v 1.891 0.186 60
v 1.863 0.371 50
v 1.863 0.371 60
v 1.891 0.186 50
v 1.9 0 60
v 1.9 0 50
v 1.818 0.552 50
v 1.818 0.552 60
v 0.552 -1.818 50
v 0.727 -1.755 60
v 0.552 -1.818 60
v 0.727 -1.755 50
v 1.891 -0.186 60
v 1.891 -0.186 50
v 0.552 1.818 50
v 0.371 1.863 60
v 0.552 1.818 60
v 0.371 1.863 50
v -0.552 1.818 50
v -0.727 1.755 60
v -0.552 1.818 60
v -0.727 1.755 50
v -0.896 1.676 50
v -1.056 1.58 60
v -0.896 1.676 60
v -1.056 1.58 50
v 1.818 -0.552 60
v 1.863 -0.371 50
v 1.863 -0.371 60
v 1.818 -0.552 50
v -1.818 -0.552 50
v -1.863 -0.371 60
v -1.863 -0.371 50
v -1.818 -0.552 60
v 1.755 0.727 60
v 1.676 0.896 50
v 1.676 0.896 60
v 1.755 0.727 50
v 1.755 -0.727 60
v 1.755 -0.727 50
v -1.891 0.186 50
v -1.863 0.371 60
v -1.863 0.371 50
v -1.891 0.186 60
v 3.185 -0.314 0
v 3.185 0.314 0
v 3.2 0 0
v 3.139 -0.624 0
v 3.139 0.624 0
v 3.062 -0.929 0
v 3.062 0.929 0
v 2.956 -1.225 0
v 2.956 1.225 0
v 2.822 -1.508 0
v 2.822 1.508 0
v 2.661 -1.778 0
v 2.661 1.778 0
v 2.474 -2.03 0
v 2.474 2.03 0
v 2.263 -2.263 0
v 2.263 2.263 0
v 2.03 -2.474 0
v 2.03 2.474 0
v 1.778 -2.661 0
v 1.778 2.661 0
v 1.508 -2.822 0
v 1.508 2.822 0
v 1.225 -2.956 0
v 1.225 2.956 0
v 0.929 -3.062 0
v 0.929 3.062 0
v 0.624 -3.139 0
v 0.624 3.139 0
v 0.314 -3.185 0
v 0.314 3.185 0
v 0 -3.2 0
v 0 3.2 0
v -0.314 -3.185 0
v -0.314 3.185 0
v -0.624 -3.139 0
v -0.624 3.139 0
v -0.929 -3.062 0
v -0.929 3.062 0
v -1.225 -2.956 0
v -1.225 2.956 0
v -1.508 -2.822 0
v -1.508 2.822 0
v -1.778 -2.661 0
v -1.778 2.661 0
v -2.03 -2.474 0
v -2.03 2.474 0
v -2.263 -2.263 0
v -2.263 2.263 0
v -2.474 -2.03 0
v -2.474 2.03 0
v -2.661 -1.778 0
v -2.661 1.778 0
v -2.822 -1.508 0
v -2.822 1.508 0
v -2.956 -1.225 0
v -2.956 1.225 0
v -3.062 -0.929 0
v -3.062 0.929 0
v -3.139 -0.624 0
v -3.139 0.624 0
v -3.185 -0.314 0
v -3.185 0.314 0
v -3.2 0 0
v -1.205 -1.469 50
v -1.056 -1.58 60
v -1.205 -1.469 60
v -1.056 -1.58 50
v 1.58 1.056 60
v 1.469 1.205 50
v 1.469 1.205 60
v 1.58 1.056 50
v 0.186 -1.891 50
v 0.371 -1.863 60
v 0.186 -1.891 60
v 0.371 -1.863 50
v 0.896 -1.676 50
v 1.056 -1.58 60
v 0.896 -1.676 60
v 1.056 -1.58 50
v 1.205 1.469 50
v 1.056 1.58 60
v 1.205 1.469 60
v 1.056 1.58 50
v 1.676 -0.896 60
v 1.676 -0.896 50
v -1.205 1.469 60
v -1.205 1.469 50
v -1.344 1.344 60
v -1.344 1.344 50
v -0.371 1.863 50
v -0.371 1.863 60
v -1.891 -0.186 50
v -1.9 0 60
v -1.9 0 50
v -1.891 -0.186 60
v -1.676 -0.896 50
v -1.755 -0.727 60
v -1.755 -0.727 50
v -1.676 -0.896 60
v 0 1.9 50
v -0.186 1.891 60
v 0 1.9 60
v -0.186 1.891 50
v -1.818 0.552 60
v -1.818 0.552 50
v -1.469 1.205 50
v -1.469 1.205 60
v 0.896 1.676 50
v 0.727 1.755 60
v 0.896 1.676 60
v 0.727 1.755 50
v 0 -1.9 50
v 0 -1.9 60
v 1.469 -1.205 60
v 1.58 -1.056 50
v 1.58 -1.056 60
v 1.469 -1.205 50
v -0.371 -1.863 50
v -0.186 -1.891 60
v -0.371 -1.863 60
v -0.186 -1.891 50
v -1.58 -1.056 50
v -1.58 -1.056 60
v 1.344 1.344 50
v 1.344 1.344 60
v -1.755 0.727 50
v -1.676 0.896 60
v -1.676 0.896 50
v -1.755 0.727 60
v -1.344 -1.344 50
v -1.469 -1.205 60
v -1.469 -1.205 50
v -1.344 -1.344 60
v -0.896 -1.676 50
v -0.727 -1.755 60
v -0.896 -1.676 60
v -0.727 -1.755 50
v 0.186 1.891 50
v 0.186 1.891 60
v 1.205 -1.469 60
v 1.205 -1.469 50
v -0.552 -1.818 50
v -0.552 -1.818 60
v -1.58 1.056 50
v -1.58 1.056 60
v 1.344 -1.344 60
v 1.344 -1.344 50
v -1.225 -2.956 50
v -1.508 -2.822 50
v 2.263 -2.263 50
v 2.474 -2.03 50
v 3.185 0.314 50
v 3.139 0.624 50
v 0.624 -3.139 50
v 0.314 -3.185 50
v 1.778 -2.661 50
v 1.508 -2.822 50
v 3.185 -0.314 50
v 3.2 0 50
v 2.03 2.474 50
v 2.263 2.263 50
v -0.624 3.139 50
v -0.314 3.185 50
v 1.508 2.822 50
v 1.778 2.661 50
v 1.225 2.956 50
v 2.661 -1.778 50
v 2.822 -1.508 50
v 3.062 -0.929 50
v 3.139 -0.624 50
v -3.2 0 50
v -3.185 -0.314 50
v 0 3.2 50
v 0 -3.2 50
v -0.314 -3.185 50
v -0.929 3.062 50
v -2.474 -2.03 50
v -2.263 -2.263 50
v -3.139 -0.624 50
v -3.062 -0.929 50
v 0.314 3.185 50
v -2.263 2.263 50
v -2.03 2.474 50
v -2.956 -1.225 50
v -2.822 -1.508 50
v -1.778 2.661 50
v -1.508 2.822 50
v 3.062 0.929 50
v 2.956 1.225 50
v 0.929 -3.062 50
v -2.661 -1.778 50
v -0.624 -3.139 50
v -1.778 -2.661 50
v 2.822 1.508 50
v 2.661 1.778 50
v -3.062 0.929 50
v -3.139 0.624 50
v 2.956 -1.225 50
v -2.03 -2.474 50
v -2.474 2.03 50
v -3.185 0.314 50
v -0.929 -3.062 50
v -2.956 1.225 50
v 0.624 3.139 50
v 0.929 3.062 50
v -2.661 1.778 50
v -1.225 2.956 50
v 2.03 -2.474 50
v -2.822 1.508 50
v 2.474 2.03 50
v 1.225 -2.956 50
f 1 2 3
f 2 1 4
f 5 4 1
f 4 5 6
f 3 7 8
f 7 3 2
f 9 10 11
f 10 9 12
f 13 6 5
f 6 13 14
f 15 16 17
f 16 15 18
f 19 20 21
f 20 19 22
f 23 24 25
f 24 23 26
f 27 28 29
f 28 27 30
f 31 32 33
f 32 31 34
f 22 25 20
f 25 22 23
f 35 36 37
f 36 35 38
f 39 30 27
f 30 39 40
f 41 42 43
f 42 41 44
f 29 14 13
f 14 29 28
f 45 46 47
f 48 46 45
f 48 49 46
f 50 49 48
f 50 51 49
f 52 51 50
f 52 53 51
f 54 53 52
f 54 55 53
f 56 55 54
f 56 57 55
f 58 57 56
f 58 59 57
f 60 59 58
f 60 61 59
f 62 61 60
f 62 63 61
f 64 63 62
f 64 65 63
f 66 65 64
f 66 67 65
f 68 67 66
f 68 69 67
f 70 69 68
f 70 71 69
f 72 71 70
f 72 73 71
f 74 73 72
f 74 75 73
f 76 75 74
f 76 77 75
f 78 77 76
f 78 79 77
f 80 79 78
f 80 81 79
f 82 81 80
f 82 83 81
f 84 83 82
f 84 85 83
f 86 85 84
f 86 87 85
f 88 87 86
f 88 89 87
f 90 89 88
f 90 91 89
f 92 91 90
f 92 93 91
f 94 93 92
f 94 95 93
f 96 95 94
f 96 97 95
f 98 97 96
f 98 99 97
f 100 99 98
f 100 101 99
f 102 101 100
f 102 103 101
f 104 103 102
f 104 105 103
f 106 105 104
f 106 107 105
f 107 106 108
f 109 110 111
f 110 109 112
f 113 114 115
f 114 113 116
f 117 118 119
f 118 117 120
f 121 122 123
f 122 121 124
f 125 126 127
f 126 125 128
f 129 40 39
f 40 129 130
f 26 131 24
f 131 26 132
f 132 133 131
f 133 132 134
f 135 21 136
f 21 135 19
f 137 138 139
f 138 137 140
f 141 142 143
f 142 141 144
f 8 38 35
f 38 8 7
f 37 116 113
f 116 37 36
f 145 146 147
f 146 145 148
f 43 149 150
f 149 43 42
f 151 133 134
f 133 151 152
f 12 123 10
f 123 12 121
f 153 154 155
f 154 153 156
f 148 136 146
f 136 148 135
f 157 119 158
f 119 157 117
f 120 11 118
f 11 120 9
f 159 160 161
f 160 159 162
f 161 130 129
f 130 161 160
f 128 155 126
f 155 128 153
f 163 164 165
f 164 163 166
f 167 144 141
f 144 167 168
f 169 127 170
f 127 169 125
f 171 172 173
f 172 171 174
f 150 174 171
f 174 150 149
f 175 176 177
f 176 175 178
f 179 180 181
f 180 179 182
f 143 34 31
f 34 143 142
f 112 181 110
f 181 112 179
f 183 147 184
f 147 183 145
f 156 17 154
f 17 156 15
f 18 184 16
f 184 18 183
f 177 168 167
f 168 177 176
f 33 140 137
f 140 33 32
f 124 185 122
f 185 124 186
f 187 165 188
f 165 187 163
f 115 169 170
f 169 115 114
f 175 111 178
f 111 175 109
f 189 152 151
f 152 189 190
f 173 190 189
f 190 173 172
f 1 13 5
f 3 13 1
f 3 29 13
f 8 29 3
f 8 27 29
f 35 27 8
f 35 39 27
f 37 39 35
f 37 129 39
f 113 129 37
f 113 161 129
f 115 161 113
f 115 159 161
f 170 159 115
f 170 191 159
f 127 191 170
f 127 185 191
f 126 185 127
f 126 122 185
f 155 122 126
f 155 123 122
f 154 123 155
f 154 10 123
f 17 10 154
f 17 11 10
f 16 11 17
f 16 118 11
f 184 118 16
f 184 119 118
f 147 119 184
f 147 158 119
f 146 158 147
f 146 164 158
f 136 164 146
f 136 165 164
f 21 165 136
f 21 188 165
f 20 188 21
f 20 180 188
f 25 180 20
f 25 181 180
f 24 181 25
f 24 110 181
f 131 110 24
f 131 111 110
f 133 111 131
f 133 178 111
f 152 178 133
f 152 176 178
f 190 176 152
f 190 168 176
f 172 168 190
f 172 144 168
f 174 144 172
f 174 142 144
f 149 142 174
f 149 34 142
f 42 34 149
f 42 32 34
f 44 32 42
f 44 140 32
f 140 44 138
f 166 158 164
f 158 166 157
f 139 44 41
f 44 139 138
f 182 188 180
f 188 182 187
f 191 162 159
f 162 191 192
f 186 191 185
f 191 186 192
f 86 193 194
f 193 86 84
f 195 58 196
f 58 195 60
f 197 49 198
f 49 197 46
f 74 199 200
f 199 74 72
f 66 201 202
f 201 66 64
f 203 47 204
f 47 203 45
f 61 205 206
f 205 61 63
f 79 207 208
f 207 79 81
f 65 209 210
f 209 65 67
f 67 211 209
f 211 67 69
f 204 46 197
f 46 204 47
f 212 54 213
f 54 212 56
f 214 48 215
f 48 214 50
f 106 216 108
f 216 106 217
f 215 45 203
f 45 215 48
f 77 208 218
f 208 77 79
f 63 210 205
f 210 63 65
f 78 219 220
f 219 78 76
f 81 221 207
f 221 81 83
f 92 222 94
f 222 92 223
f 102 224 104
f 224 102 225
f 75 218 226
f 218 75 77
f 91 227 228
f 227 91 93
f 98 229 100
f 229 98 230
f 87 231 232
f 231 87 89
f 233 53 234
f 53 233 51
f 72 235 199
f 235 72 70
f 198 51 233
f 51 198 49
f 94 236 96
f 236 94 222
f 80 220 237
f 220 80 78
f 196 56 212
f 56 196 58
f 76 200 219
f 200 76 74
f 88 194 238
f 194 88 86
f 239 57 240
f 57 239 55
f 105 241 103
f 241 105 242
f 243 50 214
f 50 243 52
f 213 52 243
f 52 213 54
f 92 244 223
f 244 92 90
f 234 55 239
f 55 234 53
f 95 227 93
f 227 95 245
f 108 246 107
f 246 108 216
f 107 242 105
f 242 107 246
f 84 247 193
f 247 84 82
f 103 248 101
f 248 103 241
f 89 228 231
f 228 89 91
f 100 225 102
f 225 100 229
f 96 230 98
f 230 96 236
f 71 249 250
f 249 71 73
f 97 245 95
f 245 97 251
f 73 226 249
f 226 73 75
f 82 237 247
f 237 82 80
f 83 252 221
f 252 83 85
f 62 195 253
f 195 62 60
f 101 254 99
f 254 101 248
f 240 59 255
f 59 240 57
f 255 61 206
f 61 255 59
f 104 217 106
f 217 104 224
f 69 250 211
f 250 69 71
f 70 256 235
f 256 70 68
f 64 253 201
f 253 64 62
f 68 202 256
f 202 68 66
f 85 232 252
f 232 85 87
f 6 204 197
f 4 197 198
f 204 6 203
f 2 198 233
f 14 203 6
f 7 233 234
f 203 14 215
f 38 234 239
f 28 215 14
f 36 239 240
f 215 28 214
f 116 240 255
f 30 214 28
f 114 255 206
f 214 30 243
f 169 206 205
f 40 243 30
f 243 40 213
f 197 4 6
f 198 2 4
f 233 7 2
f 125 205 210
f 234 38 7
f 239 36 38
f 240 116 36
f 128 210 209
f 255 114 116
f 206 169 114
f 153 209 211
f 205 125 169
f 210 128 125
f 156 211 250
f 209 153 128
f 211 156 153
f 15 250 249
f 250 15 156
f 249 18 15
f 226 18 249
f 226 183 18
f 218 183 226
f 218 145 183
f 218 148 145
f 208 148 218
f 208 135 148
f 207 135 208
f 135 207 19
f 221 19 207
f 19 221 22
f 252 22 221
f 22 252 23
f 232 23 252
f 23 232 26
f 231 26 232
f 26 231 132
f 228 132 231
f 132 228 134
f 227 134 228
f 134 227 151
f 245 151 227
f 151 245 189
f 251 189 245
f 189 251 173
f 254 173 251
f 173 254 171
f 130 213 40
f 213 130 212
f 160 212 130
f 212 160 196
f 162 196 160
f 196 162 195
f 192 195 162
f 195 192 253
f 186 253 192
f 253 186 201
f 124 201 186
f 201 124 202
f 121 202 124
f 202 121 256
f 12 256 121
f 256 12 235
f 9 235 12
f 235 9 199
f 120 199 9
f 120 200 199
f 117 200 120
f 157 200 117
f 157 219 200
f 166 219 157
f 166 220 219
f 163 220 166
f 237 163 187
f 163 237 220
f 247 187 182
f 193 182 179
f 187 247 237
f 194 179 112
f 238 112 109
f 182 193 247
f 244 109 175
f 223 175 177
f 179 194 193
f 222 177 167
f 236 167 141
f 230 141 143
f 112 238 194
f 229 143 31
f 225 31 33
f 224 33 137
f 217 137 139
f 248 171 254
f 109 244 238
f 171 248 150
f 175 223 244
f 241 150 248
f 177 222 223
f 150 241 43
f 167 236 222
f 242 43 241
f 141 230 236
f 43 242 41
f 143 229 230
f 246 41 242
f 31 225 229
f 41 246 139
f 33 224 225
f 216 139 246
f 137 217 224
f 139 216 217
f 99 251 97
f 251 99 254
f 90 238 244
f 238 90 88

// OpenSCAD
$fn = 64; // curved resolution (used for cylinders and spheres)

cylinder(60, 1.9, 1.9);

cylinder(50, 3.2, 3.2);
